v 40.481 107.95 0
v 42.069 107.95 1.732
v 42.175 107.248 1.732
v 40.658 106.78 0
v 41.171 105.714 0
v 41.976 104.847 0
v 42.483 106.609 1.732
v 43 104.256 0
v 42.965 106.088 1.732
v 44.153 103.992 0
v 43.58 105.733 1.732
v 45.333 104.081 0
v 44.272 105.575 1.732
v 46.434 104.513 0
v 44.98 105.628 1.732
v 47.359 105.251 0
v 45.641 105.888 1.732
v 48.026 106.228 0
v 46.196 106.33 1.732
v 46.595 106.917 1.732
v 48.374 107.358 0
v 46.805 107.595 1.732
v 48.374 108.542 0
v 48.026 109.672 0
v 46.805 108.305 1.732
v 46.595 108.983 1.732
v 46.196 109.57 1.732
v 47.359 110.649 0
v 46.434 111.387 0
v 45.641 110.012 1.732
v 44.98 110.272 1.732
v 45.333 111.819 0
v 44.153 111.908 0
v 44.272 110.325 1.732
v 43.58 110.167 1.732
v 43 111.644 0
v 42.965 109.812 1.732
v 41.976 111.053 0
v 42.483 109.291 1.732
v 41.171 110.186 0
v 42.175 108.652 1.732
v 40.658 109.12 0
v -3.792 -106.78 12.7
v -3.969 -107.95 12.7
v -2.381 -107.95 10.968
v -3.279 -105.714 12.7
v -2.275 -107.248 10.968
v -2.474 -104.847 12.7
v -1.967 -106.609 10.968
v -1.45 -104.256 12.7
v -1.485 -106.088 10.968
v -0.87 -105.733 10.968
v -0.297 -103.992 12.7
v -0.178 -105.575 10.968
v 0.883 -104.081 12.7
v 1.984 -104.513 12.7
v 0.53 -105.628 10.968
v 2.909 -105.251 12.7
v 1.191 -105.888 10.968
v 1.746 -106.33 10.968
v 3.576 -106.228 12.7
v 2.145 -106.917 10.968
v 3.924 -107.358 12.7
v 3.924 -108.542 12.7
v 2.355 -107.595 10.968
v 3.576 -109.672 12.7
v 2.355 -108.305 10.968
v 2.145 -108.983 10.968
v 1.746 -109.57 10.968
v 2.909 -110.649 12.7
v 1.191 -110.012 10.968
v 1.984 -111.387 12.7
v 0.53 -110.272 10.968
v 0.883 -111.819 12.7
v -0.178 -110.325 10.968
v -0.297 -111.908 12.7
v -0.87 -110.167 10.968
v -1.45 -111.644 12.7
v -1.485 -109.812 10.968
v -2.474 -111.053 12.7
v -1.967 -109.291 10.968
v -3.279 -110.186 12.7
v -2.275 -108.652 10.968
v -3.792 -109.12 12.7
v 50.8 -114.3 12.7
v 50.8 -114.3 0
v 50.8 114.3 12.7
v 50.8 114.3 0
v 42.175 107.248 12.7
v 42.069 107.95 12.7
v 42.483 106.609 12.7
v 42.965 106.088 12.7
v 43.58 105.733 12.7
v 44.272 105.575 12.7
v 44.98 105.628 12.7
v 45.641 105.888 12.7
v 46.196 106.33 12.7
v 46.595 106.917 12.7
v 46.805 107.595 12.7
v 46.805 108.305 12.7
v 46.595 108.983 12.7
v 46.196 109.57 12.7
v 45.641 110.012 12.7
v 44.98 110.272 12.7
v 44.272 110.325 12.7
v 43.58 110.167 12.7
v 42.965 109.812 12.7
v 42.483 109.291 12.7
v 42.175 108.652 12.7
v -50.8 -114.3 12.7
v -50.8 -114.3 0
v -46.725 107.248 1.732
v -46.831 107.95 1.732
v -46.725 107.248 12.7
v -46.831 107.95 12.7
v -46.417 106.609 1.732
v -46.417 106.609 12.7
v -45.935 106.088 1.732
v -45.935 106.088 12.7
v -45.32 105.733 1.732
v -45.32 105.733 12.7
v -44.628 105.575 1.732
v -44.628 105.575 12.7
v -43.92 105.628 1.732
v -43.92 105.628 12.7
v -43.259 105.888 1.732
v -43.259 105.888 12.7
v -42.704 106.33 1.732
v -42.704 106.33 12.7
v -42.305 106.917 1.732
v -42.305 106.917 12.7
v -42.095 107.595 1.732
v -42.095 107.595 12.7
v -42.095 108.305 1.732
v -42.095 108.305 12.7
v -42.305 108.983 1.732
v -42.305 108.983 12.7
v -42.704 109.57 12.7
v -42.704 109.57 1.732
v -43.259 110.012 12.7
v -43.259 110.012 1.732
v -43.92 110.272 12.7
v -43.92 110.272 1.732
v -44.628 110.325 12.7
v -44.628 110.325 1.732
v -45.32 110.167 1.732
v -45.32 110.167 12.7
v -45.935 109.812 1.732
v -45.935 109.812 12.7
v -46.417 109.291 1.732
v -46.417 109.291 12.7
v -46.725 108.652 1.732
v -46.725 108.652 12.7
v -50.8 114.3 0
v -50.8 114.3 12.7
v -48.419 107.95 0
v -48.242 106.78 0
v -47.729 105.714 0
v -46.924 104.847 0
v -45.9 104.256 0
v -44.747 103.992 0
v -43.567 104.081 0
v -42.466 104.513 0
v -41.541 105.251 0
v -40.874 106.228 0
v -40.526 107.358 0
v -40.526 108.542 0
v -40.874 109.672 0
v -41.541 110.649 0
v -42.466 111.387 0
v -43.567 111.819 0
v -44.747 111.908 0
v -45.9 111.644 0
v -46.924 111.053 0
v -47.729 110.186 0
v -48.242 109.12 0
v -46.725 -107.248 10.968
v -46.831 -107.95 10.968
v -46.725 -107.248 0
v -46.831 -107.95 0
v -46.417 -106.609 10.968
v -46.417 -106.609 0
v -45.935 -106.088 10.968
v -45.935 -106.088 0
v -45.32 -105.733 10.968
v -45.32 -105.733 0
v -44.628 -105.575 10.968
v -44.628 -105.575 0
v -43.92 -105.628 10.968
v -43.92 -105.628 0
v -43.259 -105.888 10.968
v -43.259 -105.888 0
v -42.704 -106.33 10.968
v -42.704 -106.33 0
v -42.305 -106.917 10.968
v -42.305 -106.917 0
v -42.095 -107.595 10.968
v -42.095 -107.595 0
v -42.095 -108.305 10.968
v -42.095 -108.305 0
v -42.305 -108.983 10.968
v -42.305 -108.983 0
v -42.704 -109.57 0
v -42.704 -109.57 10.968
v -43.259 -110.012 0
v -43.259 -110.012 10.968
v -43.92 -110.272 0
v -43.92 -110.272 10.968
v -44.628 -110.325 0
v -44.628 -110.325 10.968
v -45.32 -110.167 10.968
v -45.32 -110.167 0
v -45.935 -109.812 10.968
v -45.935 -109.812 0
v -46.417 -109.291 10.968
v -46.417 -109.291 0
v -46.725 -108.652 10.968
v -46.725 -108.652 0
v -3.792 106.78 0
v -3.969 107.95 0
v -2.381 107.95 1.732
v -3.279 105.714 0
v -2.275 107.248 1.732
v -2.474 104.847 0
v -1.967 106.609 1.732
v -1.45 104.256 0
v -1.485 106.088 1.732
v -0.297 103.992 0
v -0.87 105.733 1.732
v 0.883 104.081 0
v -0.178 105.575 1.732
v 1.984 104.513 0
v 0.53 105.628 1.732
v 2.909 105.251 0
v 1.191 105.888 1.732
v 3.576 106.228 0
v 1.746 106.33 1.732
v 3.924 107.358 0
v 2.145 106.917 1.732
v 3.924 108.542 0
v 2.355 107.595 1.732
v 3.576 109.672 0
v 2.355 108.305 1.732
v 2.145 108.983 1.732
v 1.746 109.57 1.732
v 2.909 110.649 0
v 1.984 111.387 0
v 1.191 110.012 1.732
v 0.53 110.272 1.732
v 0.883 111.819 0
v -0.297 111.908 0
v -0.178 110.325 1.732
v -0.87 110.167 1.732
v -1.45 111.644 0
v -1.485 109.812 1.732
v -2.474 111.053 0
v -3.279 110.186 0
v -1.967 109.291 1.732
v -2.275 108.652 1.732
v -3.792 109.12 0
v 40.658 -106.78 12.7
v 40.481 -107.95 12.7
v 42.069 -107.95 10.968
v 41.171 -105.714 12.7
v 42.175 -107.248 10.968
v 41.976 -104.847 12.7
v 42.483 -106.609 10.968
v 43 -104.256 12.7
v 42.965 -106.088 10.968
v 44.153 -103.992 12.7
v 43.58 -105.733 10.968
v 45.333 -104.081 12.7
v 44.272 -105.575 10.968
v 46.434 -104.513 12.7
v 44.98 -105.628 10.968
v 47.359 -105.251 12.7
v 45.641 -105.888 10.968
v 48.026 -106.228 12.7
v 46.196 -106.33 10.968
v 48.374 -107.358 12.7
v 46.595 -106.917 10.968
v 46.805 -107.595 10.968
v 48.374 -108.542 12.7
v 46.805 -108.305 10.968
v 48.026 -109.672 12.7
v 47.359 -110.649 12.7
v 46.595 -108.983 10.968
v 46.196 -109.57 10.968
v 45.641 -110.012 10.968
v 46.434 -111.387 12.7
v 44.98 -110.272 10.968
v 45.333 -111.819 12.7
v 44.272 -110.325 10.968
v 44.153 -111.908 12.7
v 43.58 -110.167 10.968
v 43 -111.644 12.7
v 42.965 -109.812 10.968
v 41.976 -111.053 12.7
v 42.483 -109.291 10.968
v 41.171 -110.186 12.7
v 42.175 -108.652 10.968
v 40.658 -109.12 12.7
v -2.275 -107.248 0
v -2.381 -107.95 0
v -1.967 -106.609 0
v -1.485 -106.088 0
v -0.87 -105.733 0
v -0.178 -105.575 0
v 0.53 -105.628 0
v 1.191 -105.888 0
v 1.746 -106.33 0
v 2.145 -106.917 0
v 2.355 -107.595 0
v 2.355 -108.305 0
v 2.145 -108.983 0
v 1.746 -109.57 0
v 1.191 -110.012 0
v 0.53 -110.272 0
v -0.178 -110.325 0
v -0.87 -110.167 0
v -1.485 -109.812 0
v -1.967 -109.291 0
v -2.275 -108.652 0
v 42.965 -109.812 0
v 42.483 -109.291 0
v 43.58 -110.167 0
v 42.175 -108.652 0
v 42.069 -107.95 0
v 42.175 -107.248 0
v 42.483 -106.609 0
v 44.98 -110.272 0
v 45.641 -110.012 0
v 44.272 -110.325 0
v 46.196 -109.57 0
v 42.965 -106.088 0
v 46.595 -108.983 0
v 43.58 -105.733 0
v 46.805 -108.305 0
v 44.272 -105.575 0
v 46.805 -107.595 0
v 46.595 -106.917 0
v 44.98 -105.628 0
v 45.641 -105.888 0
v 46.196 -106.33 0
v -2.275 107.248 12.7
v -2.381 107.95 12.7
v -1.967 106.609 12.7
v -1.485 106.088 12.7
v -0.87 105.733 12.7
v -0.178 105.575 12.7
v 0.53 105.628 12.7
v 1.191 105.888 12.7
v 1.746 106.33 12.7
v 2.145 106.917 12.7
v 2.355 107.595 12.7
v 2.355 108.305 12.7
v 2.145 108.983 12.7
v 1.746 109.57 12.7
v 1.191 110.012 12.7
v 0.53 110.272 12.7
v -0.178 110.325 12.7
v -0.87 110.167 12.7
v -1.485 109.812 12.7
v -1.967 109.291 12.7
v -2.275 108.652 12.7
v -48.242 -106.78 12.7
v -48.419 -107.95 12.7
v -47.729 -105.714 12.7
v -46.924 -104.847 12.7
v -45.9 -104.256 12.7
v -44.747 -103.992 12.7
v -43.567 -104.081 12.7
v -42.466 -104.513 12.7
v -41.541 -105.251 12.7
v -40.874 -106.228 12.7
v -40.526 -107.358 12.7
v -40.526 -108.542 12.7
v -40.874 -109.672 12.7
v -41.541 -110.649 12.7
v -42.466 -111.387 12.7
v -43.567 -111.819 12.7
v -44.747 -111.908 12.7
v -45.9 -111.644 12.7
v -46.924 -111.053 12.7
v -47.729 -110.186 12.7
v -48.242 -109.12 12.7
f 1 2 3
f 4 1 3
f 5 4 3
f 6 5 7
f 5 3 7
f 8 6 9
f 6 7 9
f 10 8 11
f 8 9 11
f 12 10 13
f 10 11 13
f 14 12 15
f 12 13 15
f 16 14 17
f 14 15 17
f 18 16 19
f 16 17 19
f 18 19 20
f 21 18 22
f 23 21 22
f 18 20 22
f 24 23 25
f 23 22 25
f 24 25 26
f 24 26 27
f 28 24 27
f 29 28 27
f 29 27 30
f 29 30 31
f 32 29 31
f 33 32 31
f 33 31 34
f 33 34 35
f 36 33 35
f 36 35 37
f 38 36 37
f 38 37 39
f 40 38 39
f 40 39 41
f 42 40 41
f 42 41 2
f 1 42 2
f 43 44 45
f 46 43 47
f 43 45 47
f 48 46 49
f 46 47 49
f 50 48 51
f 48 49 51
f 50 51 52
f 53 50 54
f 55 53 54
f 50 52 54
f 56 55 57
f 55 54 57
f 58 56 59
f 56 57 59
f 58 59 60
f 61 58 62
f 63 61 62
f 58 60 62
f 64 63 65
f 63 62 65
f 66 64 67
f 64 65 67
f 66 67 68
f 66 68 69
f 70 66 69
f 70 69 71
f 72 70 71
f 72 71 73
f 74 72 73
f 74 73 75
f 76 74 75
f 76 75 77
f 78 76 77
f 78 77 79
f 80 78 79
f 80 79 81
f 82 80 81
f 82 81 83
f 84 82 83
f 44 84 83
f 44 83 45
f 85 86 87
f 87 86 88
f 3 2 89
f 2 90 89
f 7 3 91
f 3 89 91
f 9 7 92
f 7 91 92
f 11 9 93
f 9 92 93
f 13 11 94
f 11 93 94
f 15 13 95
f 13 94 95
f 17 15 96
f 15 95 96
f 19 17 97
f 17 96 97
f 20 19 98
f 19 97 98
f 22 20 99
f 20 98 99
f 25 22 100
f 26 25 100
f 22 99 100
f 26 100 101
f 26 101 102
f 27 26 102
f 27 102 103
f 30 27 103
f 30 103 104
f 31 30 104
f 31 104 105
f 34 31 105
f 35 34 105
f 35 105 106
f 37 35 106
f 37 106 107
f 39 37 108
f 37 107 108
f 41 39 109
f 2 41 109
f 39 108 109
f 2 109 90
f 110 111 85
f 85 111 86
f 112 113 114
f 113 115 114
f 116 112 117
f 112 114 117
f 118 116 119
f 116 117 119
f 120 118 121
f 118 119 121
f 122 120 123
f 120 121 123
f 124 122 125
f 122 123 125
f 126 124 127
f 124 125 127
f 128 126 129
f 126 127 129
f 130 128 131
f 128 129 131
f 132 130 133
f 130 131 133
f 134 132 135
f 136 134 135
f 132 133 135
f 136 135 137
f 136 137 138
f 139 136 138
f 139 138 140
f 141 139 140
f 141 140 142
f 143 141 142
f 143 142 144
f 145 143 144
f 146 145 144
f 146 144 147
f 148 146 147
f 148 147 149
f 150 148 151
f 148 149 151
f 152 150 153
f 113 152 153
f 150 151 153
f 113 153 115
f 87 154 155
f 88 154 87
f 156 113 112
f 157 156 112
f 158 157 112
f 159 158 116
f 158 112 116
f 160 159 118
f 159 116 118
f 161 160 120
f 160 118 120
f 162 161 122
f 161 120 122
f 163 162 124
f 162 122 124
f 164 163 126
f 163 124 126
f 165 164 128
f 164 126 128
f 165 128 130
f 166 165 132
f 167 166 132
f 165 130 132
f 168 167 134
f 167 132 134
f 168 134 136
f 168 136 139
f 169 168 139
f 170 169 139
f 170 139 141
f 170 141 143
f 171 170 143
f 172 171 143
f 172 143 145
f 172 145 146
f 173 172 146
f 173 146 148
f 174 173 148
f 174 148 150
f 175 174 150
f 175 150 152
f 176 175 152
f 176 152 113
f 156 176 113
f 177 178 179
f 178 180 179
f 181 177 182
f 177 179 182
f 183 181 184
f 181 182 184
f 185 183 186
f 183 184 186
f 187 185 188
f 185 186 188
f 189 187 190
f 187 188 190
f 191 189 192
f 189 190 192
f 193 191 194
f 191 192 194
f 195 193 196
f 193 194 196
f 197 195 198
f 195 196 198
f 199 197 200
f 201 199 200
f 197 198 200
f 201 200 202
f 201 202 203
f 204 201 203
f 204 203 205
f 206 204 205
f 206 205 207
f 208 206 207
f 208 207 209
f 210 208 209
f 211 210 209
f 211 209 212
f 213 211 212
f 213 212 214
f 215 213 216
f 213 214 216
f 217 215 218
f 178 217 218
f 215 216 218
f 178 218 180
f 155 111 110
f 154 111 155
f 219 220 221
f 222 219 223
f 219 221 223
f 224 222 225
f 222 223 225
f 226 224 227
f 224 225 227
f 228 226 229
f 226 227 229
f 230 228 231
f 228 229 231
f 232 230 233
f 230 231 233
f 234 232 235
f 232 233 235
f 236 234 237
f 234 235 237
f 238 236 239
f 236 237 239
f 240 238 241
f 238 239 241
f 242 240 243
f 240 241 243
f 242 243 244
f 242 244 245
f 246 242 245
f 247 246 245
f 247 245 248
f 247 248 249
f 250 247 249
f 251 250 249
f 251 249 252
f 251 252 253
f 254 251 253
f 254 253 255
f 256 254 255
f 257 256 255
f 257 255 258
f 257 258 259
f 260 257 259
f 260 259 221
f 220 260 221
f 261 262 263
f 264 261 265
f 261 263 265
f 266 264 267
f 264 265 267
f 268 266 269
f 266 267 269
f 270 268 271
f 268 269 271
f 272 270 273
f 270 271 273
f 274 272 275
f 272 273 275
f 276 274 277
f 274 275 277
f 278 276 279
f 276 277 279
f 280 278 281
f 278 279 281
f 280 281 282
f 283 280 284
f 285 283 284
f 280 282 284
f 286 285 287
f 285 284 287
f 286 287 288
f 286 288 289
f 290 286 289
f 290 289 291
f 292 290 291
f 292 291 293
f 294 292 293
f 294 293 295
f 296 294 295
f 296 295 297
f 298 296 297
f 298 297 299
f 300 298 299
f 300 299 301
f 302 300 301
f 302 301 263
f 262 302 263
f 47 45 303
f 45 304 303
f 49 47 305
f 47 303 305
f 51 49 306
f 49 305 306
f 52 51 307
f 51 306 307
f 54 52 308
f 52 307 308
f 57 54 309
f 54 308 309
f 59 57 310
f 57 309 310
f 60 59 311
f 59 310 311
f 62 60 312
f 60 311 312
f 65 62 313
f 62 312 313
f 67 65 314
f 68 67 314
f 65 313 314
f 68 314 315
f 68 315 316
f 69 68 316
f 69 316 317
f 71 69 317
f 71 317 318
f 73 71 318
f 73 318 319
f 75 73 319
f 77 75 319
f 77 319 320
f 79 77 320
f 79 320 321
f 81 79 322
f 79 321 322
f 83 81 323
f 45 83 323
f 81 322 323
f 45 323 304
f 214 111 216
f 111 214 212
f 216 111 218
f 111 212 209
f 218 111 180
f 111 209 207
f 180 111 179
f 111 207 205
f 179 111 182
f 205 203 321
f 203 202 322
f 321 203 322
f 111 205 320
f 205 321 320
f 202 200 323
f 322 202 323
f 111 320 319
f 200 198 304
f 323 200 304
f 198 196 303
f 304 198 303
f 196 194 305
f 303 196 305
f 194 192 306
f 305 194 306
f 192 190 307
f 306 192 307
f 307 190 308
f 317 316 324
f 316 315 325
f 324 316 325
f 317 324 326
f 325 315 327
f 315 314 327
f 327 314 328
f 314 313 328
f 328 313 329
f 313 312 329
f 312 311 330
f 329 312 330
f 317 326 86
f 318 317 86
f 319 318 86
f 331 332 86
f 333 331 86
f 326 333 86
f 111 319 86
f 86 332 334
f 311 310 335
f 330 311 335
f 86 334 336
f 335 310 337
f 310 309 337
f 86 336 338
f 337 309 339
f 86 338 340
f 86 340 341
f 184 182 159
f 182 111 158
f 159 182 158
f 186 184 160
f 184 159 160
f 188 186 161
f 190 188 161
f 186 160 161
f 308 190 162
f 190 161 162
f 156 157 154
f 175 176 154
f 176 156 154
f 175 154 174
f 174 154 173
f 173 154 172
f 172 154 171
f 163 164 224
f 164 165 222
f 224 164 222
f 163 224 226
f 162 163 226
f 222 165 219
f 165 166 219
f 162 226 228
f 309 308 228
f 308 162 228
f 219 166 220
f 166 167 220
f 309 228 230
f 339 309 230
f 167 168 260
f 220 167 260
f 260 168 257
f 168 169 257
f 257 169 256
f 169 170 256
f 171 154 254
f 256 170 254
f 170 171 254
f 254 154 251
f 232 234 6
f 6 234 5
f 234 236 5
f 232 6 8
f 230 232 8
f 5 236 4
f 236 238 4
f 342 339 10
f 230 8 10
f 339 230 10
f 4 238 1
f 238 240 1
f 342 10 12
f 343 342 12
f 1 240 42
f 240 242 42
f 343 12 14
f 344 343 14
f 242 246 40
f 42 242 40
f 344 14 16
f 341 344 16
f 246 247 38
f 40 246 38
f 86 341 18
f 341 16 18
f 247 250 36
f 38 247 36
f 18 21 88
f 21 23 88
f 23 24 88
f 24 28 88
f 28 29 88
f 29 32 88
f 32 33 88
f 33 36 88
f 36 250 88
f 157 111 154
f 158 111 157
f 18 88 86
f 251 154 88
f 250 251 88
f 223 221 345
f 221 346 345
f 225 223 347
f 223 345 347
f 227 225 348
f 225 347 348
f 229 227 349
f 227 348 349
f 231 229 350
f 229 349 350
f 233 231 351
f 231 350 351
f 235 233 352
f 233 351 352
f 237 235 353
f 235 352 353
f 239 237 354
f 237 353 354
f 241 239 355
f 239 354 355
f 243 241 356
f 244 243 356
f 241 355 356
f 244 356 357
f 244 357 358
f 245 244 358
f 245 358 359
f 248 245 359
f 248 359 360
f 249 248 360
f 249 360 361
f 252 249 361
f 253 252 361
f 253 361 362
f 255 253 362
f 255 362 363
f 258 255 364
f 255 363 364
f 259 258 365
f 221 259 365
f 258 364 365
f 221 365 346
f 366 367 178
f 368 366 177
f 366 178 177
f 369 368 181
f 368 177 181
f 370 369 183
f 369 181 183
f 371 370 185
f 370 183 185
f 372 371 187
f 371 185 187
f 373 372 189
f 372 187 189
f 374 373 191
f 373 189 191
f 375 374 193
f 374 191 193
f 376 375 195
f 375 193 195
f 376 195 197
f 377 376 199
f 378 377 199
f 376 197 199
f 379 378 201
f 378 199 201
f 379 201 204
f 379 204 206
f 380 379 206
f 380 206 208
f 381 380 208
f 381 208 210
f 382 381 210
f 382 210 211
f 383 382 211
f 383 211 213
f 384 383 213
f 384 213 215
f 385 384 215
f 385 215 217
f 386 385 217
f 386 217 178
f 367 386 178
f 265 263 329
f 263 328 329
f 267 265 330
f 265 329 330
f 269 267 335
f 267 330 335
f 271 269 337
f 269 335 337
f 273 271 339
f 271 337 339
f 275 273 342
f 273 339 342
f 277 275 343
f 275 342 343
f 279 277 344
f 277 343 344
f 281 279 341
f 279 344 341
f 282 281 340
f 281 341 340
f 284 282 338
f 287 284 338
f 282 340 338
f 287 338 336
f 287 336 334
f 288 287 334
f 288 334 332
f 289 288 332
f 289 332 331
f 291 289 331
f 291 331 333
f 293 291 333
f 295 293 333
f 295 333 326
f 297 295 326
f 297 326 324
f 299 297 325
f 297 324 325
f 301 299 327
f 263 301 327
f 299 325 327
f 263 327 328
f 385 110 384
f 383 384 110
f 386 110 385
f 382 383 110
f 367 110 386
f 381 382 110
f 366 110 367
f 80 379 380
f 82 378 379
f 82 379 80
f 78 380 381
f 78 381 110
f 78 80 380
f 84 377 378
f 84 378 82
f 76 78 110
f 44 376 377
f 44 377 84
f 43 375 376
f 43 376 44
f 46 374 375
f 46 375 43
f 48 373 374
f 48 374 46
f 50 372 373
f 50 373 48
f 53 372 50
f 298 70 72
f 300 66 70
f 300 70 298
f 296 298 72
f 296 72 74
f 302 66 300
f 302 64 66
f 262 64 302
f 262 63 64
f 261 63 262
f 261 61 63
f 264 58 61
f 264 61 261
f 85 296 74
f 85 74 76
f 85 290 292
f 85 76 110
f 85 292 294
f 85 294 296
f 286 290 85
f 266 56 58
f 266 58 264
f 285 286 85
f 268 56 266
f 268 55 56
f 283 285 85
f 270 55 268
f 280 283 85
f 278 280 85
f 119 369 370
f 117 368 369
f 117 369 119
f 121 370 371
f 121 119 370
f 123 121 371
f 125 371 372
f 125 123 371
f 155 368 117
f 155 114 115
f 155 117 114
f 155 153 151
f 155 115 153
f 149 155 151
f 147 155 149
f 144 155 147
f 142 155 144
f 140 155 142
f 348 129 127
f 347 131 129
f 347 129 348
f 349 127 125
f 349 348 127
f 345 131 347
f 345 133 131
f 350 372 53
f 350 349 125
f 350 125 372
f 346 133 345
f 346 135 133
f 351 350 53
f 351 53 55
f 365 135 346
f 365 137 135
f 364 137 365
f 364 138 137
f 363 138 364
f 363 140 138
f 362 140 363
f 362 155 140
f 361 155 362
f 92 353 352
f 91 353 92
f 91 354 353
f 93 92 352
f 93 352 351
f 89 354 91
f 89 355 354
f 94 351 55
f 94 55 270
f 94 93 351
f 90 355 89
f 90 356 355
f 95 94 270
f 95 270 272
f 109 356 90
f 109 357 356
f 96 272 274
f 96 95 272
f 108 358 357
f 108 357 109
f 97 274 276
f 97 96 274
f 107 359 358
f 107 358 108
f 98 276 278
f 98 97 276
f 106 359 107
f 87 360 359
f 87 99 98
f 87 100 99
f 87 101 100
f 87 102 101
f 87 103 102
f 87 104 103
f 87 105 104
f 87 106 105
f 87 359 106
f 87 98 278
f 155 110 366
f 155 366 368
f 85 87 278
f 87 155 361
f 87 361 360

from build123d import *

# Parameters (mm, degrees)
F0_W           = 101.6
F0_H           = 228.6
F1_DEPTH       = 12.7
F3_D           = 4.7625
F3_CSINK_D     = 7.9375
F3_CSINK_ANGLE = 85
F5_D           = 4.7625
F5_CSINK_D     = 7.9375
F5_CSINK_ANGLE = 85


with BuildPart() as f1:
    # F0 (on Top) → F1 (new body)
    with BuildSketch(Plane.XY):
        Rectangle(F0_W, F0_H)
    extrude(amount=F1_DEPTH)

    # F3 (through all)
    with Locations(Plane.XY.offset(12.7)):
        with Locations((-44.45, -107.95), (0, -107.95), (44.45, -107.95)):
            CounterSinkHole(F3_D / 2, F3_CSINK_D / 2, counter_sink_angle=F3_CSINK_ANGLE)

    # F5 (through all)
    with Locations(Plane(origin=(0, 0, 0), x_dir=(1, 0, 0), z_dir=(0, 0, -1))):
        with Locations((44.45, -107.95), (0, -107.95), (-44.45, -107.95)):
            CounterSinkHole(F5_D / 2, F5_CSINK_D / 2, counter_sink_angle=F5_CSINK_ANGLE)


solid = f1.part
